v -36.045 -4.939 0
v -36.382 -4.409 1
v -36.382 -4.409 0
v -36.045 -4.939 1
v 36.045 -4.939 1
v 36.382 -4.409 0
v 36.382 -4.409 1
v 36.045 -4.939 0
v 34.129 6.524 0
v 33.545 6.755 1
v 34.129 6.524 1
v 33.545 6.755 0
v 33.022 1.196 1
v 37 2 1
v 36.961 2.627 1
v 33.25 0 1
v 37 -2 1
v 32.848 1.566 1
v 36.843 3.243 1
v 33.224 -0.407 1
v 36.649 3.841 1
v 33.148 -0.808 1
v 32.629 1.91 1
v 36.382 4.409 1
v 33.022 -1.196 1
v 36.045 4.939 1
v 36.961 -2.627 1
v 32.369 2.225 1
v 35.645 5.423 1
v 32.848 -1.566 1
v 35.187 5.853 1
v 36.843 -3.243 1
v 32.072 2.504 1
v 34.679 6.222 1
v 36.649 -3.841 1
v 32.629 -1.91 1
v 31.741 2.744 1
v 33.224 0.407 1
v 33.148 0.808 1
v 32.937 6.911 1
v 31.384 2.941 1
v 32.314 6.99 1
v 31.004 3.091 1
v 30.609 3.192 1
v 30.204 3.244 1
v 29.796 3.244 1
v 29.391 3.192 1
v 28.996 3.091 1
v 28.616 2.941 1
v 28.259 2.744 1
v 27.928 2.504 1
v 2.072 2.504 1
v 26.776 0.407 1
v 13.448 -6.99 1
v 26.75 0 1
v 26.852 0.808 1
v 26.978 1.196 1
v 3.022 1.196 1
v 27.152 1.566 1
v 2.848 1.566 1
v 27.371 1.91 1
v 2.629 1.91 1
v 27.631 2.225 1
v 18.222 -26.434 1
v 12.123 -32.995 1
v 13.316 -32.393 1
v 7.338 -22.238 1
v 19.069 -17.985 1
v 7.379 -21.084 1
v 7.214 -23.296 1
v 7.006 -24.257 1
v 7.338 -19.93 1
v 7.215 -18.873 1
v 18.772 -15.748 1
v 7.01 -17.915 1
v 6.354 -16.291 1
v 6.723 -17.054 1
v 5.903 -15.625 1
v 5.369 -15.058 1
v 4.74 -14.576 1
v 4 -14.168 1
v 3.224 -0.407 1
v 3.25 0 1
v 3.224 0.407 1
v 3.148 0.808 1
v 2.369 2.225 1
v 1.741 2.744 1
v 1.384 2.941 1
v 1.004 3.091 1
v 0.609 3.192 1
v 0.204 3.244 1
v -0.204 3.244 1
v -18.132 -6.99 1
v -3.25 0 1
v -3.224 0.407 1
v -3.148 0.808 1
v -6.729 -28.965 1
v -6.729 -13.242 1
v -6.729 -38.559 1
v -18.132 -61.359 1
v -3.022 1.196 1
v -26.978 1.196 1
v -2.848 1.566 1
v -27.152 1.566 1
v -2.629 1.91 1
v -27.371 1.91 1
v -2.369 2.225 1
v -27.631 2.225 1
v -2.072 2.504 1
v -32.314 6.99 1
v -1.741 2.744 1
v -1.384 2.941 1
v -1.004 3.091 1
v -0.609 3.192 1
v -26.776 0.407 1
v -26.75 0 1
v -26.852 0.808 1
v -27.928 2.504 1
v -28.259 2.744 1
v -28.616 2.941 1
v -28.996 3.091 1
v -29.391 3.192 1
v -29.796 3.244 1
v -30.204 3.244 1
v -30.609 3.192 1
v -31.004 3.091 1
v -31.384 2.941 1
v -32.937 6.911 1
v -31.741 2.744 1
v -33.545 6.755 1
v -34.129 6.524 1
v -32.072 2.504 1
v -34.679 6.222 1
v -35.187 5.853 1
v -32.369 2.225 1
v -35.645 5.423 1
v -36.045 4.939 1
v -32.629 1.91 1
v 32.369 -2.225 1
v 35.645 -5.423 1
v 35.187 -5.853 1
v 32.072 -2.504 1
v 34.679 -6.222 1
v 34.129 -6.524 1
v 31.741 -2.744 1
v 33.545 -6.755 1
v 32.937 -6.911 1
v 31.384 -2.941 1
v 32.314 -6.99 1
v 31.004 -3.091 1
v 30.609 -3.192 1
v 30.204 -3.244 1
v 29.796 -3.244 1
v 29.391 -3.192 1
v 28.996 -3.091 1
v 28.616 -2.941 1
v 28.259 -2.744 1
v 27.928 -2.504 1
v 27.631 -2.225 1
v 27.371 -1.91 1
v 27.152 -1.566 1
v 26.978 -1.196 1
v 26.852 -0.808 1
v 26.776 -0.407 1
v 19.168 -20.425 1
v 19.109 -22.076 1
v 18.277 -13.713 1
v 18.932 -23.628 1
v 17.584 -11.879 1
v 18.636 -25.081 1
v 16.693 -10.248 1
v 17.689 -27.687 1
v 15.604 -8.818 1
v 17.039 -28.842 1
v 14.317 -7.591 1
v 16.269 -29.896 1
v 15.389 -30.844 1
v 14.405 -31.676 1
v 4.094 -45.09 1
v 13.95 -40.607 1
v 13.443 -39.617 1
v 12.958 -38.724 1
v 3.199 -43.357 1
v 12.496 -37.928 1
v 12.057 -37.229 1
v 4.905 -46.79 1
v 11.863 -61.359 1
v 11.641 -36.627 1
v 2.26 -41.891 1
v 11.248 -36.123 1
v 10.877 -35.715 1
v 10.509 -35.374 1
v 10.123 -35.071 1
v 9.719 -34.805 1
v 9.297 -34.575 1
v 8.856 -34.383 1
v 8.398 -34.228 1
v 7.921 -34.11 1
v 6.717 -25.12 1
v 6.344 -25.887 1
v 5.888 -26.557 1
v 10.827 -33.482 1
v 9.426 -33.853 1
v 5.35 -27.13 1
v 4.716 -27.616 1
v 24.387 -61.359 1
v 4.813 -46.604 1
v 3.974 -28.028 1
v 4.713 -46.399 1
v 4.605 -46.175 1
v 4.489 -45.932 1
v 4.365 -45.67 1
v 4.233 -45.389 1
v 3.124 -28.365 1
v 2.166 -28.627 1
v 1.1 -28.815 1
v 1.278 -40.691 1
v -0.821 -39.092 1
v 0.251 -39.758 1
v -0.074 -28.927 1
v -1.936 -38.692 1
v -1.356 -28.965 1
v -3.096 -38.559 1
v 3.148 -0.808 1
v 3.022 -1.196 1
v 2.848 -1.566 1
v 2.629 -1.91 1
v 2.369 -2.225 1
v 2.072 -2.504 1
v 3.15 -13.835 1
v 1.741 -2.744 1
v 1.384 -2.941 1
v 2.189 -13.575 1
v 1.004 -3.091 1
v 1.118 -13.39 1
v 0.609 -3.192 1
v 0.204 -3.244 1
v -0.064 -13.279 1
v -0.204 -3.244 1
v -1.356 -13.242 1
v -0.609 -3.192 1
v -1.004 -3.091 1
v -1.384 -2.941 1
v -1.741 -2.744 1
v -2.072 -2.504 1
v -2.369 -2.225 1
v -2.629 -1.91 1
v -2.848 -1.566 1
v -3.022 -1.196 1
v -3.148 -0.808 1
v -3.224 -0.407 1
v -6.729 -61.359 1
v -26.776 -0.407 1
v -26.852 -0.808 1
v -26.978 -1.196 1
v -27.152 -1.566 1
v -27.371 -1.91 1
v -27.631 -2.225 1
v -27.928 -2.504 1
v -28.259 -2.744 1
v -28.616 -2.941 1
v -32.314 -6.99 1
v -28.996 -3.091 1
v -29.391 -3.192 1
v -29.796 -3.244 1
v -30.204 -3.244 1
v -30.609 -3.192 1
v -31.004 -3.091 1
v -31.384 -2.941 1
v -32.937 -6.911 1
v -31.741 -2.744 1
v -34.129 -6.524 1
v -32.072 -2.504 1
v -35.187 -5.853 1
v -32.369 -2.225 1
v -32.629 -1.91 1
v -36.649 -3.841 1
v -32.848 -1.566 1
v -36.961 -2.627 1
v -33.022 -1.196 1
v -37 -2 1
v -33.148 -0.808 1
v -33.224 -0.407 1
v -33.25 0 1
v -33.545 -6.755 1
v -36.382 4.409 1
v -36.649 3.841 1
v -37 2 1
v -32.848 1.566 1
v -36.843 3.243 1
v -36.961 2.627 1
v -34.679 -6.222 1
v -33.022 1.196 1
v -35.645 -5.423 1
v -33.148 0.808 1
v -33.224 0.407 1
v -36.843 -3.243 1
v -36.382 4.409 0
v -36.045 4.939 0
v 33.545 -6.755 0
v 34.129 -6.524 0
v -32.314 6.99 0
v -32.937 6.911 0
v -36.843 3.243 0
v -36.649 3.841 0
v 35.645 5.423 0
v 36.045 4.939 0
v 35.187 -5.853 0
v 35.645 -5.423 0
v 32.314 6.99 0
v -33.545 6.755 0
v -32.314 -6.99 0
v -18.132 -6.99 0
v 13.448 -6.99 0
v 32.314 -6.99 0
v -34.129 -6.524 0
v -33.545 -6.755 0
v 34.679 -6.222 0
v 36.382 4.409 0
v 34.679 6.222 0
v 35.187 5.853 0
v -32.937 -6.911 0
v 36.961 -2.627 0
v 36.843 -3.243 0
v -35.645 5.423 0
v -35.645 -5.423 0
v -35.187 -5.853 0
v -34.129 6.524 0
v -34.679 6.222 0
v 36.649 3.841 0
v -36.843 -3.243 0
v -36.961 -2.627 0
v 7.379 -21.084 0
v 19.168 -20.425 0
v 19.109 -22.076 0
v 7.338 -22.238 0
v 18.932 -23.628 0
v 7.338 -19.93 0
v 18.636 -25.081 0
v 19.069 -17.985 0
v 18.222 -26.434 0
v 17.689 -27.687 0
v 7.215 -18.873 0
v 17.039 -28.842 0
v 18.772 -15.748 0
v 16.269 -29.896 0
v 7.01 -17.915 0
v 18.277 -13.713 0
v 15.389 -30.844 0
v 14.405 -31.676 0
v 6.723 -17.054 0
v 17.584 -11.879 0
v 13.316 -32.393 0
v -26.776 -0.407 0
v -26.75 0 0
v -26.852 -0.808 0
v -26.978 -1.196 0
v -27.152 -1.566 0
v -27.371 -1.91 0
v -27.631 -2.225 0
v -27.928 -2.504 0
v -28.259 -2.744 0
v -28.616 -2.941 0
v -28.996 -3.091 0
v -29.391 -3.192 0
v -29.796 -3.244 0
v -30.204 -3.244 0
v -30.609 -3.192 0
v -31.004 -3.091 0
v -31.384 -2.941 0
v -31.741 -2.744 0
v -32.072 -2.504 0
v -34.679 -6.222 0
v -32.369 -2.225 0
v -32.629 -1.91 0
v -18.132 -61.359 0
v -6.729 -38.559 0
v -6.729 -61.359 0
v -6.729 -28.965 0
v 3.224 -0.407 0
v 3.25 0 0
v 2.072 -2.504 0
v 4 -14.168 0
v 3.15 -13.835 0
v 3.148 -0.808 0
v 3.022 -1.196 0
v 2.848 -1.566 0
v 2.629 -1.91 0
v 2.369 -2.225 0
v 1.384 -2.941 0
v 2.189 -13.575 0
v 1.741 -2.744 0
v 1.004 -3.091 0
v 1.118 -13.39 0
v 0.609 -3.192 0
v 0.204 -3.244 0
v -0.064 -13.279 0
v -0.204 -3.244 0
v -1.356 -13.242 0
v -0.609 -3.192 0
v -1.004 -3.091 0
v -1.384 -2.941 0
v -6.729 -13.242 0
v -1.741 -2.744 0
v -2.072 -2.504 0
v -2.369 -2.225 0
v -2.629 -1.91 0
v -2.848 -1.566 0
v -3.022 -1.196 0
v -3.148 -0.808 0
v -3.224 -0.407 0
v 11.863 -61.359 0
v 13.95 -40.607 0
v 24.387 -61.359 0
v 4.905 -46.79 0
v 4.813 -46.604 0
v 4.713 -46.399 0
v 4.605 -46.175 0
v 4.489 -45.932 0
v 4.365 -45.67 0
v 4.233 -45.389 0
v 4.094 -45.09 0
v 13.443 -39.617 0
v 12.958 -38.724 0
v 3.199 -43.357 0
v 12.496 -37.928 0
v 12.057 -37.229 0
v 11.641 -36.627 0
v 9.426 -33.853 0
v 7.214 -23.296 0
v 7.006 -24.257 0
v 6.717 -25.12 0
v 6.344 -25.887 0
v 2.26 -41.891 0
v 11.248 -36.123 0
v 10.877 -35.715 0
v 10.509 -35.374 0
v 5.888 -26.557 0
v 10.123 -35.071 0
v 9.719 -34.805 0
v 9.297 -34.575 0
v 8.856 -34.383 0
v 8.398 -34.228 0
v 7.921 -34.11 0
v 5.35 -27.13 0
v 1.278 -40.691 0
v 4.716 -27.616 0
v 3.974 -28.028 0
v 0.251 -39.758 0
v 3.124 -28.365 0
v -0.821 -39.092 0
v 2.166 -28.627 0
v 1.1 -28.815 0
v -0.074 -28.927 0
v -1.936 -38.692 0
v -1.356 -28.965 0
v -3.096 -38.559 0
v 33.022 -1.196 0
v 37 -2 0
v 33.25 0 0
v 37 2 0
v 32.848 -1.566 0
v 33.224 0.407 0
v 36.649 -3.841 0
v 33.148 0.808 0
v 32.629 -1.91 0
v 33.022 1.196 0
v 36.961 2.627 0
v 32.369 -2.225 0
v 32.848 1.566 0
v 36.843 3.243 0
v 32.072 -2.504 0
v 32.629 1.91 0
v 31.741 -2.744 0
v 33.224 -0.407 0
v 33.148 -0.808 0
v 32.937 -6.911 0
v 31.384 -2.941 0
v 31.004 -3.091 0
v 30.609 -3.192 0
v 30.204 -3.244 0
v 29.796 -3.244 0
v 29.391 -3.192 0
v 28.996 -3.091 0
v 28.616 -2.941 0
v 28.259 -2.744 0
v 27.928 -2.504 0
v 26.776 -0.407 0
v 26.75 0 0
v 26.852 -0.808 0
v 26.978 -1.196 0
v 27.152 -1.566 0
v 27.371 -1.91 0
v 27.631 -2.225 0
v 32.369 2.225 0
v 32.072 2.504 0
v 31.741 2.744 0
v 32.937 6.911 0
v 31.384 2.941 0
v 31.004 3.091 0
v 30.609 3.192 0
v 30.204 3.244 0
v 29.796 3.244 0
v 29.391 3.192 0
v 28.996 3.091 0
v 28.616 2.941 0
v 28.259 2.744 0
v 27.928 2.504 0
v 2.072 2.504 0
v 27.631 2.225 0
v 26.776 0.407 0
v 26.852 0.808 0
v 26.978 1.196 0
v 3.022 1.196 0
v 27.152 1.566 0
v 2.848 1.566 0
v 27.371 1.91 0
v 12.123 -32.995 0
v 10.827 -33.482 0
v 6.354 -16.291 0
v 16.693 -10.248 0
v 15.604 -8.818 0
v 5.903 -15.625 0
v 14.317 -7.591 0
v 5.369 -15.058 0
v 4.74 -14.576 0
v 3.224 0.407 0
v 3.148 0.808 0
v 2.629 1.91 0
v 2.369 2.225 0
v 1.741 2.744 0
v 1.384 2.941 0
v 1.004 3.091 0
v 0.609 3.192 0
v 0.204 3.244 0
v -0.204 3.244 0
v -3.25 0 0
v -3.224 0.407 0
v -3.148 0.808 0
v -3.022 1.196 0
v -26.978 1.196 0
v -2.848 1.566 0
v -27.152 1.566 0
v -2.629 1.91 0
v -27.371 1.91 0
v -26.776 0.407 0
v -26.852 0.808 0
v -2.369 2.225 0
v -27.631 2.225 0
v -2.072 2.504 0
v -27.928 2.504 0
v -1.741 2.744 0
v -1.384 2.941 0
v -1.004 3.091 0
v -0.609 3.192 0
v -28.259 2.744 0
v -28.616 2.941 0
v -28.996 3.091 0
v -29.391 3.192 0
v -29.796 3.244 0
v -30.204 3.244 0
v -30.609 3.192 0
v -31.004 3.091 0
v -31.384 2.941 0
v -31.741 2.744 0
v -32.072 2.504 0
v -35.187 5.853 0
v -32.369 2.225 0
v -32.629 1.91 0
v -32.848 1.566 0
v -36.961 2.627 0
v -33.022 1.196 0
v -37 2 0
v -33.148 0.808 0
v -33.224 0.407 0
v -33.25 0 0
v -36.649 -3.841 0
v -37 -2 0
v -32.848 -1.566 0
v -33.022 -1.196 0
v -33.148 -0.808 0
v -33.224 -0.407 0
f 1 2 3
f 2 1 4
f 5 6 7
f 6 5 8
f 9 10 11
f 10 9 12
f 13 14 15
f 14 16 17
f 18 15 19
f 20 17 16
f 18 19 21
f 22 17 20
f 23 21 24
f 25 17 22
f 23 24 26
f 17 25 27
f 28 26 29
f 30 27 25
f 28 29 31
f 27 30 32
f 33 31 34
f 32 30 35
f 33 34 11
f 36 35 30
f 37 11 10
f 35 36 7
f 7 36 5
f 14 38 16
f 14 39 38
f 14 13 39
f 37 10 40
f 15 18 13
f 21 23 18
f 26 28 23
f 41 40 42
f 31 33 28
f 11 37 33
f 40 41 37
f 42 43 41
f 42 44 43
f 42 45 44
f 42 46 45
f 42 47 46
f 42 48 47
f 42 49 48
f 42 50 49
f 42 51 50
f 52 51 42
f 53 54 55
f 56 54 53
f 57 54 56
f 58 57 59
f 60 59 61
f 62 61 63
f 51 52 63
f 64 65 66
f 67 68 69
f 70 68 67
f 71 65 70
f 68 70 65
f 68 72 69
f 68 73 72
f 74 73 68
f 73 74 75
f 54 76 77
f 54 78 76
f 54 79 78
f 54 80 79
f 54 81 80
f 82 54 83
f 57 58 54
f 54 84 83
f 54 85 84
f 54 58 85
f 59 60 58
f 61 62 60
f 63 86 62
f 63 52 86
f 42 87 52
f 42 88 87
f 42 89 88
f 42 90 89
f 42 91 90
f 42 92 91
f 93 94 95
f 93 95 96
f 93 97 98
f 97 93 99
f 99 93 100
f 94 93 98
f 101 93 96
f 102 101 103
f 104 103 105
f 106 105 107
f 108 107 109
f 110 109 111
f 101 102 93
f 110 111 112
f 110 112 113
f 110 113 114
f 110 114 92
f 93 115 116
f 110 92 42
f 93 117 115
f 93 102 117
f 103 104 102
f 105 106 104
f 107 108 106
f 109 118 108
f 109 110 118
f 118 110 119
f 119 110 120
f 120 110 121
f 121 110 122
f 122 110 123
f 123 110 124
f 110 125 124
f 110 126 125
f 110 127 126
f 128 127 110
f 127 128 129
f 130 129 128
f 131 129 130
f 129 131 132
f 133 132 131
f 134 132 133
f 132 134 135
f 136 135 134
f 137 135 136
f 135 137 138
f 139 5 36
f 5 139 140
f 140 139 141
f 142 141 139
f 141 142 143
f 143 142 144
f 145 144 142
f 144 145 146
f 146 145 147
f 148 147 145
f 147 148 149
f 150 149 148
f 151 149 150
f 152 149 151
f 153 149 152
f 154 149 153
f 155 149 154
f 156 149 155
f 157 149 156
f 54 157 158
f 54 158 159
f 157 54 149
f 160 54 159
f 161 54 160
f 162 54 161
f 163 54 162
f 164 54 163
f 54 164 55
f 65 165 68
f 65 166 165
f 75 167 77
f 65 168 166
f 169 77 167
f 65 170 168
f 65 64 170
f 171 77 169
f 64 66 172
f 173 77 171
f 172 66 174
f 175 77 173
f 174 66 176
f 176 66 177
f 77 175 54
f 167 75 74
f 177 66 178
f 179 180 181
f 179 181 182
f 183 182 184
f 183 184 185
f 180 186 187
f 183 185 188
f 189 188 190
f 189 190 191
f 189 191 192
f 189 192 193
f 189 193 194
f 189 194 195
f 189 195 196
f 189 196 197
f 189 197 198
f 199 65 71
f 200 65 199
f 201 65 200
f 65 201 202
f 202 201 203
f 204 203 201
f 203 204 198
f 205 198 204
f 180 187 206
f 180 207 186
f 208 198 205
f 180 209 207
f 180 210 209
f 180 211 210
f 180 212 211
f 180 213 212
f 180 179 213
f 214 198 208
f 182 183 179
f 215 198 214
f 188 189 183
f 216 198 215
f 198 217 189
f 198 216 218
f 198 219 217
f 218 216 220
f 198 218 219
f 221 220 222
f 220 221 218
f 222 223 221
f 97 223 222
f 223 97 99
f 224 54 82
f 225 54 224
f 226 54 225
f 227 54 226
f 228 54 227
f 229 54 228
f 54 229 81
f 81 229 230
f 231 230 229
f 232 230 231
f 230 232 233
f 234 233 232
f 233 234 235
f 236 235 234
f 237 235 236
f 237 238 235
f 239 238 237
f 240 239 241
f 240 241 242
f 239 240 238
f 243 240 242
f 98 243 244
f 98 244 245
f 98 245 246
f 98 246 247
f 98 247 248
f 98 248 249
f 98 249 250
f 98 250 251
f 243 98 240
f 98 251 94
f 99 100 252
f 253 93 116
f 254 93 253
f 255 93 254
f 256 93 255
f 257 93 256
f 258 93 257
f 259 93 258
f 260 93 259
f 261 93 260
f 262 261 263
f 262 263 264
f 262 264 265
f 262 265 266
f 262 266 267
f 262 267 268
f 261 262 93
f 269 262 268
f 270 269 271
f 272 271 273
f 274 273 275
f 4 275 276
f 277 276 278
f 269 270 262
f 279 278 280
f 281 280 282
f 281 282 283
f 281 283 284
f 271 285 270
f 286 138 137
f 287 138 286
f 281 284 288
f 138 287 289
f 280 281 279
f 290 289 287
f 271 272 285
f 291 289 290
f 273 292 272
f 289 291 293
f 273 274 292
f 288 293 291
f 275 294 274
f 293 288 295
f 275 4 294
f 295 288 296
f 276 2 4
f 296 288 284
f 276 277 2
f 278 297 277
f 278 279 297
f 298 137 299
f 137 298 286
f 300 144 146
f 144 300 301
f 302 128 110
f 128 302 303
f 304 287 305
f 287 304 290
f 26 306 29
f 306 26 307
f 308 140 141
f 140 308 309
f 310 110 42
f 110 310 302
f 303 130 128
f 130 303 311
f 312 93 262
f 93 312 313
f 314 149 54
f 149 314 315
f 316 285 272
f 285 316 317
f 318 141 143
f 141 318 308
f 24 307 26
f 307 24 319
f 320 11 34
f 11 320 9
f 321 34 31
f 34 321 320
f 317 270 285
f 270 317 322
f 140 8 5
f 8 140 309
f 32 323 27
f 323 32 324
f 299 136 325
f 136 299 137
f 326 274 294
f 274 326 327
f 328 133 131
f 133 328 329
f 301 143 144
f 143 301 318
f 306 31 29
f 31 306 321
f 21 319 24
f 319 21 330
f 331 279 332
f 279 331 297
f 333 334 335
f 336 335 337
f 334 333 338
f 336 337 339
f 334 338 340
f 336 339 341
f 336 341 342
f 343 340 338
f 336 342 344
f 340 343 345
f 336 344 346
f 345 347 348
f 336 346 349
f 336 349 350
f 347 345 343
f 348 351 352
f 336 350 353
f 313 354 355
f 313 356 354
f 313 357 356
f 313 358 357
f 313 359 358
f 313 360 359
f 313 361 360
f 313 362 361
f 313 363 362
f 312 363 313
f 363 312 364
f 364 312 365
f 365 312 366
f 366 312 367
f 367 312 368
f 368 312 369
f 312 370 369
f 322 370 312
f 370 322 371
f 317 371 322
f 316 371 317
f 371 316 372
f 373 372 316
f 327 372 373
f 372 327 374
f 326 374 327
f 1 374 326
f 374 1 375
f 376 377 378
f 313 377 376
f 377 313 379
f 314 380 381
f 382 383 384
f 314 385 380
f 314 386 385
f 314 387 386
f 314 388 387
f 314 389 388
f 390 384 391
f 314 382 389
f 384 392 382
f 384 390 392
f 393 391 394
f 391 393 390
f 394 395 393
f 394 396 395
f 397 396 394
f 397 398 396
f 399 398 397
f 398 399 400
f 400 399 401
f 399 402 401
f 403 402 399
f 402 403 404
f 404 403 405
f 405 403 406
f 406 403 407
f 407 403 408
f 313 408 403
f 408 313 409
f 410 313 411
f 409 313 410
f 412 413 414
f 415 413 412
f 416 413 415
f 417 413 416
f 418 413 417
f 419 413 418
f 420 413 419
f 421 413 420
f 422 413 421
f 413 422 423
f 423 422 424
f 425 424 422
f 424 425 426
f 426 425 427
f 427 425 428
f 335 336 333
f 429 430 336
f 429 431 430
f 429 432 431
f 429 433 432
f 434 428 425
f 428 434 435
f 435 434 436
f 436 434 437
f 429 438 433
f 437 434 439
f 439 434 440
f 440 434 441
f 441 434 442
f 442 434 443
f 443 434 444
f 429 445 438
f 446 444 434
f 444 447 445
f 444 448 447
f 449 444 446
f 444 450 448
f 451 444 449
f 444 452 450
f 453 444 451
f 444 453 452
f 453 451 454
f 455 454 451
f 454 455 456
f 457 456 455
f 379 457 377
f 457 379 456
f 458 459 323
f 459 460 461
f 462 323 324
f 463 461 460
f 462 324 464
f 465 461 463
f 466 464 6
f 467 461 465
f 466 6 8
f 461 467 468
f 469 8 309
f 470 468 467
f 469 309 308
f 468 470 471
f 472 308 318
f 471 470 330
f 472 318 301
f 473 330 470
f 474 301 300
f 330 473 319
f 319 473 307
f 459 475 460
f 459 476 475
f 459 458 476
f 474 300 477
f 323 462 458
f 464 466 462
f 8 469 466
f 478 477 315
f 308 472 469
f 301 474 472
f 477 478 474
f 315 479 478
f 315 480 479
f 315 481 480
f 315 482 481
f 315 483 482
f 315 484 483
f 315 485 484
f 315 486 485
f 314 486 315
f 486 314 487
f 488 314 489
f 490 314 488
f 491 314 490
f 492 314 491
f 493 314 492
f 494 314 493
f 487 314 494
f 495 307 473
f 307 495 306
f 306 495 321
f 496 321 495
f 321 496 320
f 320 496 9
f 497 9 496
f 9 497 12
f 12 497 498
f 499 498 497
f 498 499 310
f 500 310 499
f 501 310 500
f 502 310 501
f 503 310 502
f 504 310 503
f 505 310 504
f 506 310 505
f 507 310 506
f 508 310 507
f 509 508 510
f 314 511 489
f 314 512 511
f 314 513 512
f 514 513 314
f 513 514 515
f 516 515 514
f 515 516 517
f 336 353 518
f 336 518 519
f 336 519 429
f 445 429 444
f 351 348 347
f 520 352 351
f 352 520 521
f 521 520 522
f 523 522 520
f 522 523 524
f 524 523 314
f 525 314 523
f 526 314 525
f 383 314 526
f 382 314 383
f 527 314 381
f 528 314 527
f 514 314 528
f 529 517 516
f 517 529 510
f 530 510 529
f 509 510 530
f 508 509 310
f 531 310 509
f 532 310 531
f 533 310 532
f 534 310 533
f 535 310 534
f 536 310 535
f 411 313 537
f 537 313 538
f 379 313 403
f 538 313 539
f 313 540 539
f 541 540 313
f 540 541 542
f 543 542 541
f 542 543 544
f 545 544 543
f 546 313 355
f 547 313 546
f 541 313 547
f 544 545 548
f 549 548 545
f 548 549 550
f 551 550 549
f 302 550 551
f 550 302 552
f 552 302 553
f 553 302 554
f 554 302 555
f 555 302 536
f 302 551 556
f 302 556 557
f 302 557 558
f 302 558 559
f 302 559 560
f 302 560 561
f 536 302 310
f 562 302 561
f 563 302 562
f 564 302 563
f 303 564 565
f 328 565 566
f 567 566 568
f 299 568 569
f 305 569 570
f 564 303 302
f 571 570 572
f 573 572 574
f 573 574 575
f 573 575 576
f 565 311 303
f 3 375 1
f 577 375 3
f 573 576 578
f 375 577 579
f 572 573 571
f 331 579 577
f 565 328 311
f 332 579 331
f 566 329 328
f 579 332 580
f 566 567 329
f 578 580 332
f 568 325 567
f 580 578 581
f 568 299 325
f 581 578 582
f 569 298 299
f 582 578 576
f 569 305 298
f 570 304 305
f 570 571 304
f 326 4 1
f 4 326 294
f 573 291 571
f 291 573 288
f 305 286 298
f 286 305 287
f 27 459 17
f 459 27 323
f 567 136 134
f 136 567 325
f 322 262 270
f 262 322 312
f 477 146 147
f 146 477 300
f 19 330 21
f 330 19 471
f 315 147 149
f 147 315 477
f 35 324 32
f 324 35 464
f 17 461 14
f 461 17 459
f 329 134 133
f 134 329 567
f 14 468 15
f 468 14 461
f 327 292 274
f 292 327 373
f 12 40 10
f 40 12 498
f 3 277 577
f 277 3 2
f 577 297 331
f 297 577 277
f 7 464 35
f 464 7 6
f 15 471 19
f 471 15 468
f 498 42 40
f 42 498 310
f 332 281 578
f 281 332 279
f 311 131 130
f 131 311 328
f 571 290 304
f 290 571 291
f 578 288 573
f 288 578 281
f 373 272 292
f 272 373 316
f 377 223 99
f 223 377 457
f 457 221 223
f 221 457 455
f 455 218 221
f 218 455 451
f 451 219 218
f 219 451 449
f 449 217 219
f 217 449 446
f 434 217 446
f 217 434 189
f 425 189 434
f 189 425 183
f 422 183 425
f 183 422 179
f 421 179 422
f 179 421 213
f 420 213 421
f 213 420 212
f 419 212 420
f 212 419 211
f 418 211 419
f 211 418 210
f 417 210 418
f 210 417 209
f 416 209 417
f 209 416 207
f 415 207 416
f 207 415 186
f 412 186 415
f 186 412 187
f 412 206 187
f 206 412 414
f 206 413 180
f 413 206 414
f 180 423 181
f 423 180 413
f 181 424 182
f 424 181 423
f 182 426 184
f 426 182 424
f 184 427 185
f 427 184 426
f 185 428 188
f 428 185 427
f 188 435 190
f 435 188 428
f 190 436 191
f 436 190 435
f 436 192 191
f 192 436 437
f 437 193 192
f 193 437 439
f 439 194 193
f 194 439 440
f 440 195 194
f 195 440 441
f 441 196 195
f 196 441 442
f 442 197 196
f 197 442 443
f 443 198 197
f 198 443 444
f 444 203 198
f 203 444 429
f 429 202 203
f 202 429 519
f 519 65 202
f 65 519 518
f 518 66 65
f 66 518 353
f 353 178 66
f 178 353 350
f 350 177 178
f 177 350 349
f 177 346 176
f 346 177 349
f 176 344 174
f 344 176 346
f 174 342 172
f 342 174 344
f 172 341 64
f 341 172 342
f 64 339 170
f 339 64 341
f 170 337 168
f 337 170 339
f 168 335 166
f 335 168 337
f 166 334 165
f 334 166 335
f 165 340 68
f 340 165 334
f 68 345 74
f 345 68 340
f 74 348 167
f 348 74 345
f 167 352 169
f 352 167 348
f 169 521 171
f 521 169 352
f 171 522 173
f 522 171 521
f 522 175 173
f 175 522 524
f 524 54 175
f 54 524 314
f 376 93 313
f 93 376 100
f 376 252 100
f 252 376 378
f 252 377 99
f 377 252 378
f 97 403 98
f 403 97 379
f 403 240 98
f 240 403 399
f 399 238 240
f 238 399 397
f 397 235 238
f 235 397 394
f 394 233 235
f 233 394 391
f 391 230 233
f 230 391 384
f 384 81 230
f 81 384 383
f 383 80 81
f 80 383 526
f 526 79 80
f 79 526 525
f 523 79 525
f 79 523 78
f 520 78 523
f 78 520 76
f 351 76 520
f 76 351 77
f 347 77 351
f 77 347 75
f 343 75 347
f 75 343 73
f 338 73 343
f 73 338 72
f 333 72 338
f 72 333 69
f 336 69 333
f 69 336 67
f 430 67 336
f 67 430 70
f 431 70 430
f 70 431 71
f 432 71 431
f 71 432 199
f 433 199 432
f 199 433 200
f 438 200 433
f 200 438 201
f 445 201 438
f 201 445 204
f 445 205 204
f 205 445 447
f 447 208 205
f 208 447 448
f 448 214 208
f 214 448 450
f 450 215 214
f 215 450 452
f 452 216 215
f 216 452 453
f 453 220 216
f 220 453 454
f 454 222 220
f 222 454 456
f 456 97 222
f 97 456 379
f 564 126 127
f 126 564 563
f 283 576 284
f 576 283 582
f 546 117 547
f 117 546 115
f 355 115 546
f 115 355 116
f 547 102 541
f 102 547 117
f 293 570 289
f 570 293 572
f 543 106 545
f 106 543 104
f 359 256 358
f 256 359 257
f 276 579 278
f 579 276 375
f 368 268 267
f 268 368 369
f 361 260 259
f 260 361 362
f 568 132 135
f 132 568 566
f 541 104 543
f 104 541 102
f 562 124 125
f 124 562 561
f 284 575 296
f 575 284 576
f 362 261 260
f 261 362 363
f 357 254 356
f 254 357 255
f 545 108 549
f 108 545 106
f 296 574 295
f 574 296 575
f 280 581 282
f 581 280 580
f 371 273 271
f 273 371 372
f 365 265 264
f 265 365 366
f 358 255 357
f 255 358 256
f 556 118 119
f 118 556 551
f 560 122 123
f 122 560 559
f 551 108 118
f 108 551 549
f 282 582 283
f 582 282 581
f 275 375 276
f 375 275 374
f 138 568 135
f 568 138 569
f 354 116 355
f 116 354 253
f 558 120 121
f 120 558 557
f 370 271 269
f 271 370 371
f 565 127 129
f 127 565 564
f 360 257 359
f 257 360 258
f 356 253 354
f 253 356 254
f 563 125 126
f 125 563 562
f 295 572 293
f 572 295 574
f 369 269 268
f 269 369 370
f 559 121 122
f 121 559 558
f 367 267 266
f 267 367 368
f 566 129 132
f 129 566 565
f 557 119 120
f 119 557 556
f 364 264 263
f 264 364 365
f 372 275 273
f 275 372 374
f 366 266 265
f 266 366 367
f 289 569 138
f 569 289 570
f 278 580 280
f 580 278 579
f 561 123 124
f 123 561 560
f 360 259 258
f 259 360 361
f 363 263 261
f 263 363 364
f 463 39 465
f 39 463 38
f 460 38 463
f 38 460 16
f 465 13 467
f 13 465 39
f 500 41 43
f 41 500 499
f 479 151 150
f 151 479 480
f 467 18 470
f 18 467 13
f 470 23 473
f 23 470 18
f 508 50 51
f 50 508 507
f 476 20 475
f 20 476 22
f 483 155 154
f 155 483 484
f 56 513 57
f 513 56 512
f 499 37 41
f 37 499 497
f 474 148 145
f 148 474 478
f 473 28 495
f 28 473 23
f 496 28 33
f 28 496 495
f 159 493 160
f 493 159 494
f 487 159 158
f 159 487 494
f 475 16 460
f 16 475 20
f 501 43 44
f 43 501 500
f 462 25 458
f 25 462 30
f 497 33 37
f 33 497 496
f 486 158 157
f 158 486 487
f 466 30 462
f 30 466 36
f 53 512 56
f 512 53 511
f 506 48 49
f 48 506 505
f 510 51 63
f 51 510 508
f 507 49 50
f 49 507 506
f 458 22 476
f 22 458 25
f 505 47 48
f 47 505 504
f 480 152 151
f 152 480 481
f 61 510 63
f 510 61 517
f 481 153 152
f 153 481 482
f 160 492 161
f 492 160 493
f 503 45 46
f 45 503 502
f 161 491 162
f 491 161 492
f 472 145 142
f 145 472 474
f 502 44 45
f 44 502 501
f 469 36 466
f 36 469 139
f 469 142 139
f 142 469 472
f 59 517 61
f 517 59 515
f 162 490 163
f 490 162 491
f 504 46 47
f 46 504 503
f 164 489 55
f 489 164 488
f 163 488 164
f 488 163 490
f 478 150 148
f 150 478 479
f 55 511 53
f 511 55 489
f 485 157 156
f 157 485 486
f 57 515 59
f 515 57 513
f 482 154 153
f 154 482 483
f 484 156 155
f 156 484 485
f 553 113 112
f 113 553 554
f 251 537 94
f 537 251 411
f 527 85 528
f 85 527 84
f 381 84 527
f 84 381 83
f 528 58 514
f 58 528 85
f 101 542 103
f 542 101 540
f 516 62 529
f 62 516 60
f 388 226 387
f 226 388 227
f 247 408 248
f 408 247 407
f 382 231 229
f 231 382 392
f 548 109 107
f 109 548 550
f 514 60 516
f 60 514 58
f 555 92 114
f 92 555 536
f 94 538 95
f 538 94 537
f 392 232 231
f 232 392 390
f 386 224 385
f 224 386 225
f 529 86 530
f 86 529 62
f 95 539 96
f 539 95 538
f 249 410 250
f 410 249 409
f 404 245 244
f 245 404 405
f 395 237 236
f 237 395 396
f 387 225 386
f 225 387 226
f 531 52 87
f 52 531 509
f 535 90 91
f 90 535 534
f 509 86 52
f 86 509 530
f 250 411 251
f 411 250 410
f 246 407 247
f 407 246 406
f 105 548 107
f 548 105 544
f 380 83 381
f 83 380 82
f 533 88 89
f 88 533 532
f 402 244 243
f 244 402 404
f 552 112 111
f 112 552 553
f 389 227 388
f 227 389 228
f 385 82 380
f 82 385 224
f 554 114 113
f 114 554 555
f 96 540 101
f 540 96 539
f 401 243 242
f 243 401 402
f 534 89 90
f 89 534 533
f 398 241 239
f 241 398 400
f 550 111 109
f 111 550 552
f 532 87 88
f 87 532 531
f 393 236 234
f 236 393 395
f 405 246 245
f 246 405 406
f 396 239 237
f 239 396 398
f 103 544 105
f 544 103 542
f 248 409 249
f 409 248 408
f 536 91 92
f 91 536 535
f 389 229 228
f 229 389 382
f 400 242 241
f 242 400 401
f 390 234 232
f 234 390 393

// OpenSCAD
$fn = 50;


difference() {
	union() {
		translate(v = [0, 0, 0]) {
			rotate(a = [0, 0, 0]) {
				hull() {
					translate(v = [-32.0000000000, 2.0000000000, 0]) {
						rotate(a = [0, 0, 0]) {
							translate(v = [0, 0, 0]) {
								rotate(a = [0, 0, 0]) {
									cylinder(h = 1, r = 5);
								}
							}
						}
					}
					translate(v = [32.0000000000, 2.0000000000, 0]) {
						rotate(a = [0, 0, 0]) {
							translate(v = [0, 0, 0]) {
								rotate(a = [0, 0, 0]) {
									cylinder(h = 1, r = 5);
								}
							}
						}
					}
					translate(v = [-32.0000000000, -2.0000000000, 0]) {
						rotate(a = [0, 0, 0]) {
							translate(v = [0, 0, 0]) {
								rotate(a = [0, 0, 0]) {
									cylinder(h = 1, r = 5);
								}
							}
						}
					}
					translate(v = [32.0000000000, -2.0000000000, 0]) {
						rotate(a = [0, 0, 0]) {
							translate(v = [0, 0, 0]) {
								rotate(a = [0, 0, 0]) {
									cylinder(h = 1, r = 5);
								}
							}
						}
					}
				}
			}
		}
		translate(v = [0, -5, 0]) {
			rotate(a = [0, 0, 0]) {
				linear_extrude(height = 1) {
					text(font = "DejaVu Sans Mono:style=Bold", halign = "center", size = 57.0000000000, text = "R", valign = "top");
				}
			}
		}
	}
	union() {
		translate(v = [-30.0000000000, 0.0000000000, -125.0000000000]) {
			rotate(a = [0, 0, 0]) {
				cylinder(h = 250, r = 3.2500000000);
			}
		}
		translate(v = [30.0000000000, 0.0000000000, -125.0000000000]) {
			rotate(a = [0, 0, 0]) {
				cylinder(h = 250, r = 3.2500000000);
			}
		}
		translate(v = [30.0000000000, 0.0000000000, -125.0000000000]) {
			rotate(a = [0, 0, 0]) {
				cylinder(h = 250, r = 3.2500000000);
			}
		}
		translate(v = [0, 0, -125.0000000000]) {
			rotate(a = [0, 0, 0]) {
				cylinder(h = 250, r = 3.2500000000);
			}
		}
	}
}
